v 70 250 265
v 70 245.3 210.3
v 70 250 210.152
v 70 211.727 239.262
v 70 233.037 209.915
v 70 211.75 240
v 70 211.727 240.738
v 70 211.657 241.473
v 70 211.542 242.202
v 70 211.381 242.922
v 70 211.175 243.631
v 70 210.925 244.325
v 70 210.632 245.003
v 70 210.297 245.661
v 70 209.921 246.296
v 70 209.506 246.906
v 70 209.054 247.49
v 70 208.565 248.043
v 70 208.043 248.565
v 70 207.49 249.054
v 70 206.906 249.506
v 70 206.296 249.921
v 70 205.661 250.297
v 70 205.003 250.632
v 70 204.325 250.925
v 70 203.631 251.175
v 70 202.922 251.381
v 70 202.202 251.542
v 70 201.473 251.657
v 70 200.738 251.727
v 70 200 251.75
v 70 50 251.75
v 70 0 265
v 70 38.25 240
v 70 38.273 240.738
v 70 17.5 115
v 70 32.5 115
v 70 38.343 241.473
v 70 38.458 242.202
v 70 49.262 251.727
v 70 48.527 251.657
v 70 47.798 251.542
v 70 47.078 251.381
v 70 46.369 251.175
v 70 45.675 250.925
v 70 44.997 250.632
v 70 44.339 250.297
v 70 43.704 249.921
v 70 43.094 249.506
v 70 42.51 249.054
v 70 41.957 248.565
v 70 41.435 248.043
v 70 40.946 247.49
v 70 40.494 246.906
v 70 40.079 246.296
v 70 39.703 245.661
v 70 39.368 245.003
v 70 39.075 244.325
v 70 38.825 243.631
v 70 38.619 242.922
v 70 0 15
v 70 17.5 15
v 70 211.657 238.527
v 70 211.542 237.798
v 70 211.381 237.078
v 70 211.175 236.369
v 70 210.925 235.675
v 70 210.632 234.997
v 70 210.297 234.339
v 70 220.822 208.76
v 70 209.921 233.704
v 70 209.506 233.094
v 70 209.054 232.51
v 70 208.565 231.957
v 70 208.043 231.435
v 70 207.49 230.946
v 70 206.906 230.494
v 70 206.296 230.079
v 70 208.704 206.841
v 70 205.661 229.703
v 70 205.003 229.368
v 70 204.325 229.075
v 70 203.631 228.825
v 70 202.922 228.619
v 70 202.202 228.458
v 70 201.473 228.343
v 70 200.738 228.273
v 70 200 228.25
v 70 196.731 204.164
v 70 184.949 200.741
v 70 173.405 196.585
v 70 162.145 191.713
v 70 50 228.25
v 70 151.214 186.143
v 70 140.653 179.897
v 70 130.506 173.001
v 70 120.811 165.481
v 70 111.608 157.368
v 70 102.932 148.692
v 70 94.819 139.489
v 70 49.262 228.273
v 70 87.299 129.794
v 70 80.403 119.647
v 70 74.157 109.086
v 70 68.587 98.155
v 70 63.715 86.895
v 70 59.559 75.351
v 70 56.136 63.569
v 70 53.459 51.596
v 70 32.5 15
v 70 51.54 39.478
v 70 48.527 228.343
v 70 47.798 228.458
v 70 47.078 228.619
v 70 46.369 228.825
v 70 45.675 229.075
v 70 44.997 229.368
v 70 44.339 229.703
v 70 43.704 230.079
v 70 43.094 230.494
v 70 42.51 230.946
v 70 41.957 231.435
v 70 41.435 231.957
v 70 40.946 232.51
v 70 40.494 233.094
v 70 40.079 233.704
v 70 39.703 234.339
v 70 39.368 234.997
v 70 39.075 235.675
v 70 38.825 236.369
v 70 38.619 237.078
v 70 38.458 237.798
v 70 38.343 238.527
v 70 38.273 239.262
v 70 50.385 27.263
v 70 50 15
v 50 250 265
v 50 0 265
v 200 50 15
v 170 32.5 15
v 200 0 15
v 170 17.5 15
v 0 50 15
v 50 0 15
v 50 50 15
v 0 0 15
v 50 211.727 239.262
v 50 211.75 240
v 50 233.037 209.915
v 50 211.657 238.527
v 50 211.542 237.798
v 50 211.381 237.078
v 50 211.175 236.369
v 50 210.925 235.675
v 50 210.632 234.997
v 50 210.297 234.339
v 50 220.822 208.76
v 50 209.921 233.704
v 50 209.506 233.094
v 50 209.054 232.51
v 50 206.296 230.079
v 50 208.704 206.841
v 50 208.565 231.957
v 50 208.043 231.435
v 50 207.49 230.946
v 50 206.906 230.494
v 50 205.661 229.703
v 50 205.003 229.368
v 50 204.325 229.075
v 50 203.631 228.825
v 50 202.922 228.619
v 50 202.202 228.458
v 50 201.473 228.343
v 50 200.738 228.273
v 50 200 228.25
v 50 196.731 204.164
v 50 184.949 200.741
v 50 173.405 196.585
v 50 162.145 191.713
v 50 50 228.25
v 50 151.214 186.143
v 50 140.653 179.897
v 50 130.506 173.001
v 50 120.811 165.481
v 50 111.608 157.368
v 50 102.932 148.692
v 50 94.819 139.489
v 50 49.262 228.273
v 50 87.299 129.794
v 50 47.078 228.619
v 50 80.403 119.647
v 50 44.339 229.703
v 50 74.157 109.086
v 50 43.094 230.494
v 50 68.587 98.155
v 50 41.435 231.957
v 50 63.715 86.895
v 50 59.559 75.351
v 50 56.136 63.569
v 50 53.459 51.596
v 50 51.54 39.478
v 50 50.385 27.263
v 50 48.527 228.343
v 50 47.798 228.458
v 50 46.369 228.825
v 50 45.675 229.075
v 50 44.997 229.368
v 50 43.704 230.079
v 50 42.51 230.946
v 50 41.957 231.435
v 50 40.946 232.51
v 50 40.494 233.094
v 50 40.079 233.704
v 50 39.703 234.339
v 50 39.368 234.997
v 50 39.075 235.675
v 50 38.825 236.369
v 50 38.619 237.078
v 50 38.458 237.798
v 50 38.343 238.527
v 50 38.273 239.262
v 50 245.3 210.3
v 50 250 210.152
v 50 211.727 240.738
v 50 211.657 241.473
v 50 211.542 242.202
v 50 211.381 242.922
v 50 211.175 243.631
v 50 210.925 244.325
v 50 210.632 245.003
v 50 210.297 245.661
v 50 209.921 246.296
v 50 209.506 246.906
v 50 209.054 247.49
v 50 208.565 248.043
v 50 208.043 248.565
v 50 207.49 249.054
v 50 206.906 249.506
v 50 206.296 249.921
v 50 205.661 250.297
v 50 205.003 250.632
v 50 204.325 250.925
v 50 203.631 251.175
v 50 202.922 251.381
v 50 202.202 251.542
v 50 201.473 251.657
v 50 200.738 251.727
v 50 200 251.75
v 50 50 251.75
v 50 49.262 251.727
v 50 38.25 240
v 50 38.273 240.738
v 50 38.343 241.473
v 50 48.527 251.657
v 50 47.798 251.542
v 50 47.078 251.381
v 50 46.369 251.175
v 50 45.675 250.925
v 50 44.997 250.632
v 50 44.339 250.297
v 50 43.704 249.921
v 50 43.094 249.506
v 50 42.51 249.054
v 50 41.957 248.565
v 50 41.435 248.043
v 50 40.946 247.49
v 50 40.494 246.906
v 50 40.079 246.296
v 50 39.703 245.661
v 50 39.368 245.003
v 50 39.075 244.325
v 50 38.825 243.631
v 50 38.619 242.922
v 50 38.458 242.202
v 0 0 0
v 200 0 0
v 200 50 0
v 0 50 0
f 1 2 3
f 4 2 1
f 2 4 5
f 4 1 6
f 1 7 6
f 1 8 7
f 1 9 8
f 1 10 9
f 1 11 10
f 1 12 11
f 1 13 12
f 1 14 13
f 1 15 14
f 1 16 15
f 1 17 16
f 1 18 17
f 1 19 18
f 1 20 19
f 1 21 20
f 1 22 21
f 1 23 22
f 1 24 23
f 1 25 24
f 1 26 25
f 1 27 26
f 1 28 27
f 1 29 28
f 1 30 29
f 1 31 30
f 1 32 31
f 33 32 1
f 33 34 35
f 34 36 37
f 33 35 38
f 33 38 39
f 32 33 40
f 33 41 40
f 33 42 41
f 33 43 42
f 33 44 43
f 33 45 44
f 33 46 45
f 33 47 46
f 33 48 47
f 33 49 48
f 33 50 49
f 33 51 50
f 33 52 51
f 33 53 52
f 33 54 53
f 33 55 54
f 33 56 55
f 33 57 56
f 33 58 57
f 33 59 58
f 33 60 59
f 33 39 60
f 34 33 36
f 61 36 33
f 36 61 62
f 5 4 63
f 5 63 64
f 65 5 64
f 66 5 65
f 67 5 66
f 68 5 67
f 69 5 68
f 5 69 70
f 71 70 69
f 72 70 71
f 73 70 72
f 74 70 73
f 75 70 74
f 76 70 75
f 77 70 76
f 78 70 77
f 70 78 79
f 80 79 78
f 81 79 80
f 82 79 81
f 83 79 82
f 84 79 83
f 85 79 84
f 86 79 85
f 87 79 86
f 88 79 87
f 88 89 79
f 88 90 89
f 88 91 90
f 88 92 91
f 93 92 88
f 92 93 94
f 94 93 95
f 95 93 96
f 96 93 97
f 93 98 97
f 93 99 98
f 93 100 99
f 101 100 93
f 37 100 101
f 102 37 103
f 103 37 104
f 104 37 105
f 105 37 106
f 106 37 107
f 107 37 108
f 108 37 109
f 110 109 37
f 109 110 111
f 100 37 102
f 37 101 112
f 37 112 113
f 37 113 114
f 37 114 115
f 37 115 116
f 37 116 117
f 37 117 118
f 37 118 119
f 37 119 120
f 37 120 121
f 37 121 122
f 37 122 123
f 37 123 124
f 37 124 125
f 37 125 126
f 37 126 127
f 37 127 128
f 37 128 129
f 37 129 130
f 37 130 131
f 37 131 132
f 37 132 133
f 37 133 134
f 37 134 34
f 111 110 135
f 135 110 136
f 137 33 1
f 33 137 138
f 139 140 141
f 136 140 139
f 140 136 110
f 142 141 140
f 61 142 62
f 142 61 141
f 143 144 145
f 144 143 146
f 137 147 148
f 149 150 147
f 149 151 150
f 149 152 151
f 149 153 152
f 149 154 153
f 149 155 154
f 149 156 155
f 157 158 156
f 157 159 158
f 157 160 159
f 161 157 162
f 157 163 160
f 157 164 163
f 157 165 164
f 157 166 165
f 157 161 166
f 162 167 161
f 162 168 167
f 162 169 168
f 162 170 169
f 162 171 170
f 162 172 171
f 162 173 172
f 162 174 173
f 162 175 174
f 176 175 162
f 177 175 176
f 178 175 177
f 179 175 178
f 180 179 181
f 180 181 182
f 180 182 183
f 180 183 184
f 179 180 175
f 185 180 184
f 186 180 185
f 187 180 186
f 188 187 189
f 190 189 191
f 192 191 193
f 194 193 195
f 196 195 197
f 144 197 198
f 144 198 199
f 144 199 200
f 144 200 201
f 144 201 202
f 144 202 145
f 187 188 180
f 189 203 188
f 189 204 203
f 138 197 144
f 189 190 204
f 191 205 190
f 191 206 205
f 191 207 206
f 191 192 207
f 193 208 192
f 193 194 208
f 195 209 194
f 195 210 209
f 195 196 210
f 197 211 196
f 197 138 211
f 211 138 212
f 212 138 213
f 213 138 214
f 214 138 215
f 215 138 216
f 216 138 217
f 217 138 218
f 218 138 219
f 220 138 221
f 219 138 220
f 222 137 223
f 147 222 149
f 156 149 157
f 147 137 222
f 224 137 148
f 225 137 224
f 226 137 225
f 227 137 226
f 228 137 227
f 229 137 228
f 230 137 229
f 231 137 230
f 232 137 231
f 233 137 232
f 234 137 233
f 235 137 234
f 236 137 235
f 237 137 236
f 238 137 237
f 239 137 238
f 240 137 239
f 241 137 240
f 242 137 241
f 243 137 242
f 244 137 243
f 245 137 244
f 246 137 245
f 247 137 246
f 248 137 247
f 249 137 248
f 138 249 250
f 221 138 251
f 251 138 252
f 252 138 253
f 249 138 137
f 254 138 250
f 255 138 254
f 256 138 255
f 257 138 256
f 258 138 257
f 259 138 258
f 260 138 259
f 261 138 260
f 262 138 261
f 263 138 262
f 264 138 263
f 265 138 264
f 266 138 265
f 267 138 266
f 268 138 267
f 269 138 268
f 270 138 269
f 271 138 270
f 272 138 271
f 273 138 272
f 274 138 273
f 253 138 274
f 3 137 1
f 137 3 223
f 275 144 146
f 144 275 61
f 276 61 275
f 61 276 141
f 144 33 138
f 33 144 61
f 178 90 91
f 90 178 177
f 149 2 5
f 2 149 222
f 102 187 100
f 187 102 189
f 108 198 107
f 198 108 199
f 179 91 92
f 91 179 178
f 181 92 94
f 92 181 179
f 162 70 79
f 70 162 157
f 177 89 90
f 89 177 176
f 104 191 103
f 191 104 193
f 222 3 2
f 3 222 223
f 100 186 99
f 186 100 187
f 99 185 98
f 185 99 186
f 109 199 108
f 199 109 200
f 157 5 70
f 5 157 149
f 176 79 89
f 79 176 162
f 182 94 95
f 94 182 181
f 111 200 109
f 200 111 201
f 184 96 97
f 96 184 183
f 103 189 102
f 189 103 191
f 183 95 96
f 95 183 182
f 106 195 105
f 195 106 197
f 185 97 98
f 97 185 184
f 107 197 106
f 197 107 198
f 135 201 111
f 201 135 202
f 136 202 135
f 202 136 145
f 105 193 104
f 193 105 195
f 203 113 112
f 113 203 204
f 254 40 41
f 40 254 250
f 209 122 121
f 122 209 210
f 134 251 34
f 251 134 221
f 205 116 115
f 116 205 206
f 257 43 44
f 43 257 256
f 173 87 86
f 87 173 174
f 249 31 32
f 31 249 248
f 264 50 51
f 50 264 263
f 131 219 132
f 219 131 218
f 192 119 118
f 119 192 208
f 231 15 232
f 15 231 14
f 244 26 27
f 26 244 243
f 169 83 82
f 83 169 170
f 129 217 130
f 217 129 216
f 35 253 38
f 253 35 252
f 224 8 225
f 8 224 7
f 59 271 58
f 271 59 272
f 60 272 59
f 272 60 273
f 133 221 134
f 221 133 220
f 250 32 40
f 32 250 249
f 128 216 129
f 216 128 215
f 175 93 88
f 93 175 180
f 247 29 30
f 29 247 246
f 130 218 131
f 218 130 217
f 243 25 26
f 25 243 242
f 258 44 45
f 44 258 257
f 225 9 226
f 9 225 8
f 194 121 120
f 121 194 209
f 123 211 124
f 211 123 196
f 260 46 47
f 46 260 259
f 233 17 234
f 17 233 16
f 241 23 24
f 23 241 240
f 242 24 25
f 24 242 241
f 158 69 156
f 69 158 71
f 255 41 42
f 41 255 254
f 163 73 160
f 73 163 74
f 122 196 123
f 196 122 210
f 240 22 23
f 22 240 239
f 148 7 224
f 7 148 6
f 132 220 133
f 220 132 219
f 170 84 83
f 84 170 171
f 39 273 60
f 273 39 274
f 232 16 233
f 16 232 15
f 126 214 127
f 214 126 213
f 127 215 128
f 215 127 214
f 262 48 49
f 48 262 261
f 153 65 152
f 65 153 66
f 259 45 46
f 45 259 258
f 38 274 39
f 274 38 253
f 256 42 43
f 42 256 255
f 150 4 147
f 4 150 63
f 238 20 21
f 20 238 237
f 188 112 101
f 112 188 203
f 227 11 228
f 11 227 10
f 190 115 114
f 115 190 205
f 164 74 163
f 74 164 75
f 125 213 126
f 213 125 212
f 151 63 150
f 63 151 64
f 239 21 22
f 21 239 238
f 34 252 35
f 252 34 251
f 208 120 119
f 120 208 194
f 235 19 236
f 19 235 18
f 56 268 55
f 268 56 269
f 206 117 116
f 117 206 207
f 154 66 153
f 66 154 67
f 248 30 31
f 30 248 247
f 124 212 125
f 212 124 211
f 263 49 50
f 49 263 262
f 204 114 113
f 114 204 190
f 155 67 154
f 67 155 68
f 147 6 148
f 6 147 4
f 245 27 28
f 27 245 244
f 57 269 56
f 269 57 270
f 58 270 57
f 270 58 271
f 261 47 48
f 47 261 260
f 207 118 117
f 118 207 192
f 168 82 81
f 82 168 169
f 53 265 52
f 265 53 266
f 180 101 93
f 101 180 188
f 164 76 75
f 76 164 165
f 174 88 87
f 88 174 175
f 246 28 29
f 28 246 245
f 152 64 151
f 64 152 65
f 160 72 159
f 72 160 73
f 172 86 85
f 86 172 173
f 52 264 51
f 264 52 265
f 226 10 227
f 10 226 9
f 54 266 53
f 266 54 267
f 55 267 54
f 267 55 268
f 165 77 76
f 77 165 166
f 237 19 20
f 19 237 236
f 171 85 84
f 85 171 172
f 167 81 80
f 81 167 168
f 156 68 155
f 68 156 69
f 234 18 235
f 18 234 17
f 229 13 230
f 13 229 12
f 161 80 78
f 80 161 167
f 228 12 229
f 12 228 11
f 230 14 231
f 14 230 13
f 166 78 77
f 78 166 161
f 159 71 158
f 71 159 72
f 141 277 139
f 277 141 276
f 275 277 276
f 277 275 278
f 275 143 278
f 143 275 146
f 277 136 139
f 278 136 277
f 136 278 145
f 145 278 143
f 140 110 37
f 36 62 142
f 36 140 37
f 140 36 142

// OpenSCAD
$fn = 100;
//Base Cube
cubeLength = 200;
cubeWidth = 50;
cubeDepth = 15;

//Perpendicular Cube 
PCubeDepth = 20;
PCubeWidth = 250;
PCubeLength = 250;
    //Translations for the Perpendicular Cube
    PCOffsetX = 50;
    PCOffsetY = 50;
    PCOffsetY2 = PCubeWidth - PCOffsetY;
    PCOffsetXOffTop = PCubeLength + cubeDepth - 25;
//Triangle Lengths
TriLength = 100;
TriDepth = 100;
TriOffset = 17.50;
TriWidth = 15;

//Perpendicular Cylinder Cut Big
PCylinderCutDepth = PCubeDepth;
PCylinderCutRadius = 195.30;

//Perpendicular Cylinder Cut Small
PCylinderSmallCutRadius = 11.75;

//The Main Code Block
cube([cubeLength, cubeWidth, cubeDepth]);

difference(){
    translate([PCOffsetX , 0, cubeDepth])
    cube([PCubeDepth, PCubeWidth, PCubeLength]);
    
    translate([PCOffsetX , cubeWidth + PCylinderCutRadius, cubeDepth]) 
    rotate([ 0, 90, 0])
    cylinder(PCylinderCutDepth, r = PCylinderCutRadius);
    
    hull(){
        translate([PCOffsetX ,PCOffsetY , PCOffsetXOffTop]) 
        rotate([ 0, 90, 0])
        cylinder(PCylinderCutDepth, r = PCylinderSmallCutRadius);
        
        translate([PCOffsetX ,PCOffsetY2 , PCOffsetXOffTop]) 
        rotate([ 0, 90, 0])
        cylinder(PCylinderCutDepth, r = PCylinderSmallCutRadius);
        }
}
translate([PCubeDepth + PCOffsetX, TriOffset + TriWidth, cubeDepth])
rotate([ 90, 0, 0])
linear_extrude(TriWidth)
polygon(points = [[ 0, 0],[ TriLength, 0], [ 0, TriDepth], [ 0, 0]]);
